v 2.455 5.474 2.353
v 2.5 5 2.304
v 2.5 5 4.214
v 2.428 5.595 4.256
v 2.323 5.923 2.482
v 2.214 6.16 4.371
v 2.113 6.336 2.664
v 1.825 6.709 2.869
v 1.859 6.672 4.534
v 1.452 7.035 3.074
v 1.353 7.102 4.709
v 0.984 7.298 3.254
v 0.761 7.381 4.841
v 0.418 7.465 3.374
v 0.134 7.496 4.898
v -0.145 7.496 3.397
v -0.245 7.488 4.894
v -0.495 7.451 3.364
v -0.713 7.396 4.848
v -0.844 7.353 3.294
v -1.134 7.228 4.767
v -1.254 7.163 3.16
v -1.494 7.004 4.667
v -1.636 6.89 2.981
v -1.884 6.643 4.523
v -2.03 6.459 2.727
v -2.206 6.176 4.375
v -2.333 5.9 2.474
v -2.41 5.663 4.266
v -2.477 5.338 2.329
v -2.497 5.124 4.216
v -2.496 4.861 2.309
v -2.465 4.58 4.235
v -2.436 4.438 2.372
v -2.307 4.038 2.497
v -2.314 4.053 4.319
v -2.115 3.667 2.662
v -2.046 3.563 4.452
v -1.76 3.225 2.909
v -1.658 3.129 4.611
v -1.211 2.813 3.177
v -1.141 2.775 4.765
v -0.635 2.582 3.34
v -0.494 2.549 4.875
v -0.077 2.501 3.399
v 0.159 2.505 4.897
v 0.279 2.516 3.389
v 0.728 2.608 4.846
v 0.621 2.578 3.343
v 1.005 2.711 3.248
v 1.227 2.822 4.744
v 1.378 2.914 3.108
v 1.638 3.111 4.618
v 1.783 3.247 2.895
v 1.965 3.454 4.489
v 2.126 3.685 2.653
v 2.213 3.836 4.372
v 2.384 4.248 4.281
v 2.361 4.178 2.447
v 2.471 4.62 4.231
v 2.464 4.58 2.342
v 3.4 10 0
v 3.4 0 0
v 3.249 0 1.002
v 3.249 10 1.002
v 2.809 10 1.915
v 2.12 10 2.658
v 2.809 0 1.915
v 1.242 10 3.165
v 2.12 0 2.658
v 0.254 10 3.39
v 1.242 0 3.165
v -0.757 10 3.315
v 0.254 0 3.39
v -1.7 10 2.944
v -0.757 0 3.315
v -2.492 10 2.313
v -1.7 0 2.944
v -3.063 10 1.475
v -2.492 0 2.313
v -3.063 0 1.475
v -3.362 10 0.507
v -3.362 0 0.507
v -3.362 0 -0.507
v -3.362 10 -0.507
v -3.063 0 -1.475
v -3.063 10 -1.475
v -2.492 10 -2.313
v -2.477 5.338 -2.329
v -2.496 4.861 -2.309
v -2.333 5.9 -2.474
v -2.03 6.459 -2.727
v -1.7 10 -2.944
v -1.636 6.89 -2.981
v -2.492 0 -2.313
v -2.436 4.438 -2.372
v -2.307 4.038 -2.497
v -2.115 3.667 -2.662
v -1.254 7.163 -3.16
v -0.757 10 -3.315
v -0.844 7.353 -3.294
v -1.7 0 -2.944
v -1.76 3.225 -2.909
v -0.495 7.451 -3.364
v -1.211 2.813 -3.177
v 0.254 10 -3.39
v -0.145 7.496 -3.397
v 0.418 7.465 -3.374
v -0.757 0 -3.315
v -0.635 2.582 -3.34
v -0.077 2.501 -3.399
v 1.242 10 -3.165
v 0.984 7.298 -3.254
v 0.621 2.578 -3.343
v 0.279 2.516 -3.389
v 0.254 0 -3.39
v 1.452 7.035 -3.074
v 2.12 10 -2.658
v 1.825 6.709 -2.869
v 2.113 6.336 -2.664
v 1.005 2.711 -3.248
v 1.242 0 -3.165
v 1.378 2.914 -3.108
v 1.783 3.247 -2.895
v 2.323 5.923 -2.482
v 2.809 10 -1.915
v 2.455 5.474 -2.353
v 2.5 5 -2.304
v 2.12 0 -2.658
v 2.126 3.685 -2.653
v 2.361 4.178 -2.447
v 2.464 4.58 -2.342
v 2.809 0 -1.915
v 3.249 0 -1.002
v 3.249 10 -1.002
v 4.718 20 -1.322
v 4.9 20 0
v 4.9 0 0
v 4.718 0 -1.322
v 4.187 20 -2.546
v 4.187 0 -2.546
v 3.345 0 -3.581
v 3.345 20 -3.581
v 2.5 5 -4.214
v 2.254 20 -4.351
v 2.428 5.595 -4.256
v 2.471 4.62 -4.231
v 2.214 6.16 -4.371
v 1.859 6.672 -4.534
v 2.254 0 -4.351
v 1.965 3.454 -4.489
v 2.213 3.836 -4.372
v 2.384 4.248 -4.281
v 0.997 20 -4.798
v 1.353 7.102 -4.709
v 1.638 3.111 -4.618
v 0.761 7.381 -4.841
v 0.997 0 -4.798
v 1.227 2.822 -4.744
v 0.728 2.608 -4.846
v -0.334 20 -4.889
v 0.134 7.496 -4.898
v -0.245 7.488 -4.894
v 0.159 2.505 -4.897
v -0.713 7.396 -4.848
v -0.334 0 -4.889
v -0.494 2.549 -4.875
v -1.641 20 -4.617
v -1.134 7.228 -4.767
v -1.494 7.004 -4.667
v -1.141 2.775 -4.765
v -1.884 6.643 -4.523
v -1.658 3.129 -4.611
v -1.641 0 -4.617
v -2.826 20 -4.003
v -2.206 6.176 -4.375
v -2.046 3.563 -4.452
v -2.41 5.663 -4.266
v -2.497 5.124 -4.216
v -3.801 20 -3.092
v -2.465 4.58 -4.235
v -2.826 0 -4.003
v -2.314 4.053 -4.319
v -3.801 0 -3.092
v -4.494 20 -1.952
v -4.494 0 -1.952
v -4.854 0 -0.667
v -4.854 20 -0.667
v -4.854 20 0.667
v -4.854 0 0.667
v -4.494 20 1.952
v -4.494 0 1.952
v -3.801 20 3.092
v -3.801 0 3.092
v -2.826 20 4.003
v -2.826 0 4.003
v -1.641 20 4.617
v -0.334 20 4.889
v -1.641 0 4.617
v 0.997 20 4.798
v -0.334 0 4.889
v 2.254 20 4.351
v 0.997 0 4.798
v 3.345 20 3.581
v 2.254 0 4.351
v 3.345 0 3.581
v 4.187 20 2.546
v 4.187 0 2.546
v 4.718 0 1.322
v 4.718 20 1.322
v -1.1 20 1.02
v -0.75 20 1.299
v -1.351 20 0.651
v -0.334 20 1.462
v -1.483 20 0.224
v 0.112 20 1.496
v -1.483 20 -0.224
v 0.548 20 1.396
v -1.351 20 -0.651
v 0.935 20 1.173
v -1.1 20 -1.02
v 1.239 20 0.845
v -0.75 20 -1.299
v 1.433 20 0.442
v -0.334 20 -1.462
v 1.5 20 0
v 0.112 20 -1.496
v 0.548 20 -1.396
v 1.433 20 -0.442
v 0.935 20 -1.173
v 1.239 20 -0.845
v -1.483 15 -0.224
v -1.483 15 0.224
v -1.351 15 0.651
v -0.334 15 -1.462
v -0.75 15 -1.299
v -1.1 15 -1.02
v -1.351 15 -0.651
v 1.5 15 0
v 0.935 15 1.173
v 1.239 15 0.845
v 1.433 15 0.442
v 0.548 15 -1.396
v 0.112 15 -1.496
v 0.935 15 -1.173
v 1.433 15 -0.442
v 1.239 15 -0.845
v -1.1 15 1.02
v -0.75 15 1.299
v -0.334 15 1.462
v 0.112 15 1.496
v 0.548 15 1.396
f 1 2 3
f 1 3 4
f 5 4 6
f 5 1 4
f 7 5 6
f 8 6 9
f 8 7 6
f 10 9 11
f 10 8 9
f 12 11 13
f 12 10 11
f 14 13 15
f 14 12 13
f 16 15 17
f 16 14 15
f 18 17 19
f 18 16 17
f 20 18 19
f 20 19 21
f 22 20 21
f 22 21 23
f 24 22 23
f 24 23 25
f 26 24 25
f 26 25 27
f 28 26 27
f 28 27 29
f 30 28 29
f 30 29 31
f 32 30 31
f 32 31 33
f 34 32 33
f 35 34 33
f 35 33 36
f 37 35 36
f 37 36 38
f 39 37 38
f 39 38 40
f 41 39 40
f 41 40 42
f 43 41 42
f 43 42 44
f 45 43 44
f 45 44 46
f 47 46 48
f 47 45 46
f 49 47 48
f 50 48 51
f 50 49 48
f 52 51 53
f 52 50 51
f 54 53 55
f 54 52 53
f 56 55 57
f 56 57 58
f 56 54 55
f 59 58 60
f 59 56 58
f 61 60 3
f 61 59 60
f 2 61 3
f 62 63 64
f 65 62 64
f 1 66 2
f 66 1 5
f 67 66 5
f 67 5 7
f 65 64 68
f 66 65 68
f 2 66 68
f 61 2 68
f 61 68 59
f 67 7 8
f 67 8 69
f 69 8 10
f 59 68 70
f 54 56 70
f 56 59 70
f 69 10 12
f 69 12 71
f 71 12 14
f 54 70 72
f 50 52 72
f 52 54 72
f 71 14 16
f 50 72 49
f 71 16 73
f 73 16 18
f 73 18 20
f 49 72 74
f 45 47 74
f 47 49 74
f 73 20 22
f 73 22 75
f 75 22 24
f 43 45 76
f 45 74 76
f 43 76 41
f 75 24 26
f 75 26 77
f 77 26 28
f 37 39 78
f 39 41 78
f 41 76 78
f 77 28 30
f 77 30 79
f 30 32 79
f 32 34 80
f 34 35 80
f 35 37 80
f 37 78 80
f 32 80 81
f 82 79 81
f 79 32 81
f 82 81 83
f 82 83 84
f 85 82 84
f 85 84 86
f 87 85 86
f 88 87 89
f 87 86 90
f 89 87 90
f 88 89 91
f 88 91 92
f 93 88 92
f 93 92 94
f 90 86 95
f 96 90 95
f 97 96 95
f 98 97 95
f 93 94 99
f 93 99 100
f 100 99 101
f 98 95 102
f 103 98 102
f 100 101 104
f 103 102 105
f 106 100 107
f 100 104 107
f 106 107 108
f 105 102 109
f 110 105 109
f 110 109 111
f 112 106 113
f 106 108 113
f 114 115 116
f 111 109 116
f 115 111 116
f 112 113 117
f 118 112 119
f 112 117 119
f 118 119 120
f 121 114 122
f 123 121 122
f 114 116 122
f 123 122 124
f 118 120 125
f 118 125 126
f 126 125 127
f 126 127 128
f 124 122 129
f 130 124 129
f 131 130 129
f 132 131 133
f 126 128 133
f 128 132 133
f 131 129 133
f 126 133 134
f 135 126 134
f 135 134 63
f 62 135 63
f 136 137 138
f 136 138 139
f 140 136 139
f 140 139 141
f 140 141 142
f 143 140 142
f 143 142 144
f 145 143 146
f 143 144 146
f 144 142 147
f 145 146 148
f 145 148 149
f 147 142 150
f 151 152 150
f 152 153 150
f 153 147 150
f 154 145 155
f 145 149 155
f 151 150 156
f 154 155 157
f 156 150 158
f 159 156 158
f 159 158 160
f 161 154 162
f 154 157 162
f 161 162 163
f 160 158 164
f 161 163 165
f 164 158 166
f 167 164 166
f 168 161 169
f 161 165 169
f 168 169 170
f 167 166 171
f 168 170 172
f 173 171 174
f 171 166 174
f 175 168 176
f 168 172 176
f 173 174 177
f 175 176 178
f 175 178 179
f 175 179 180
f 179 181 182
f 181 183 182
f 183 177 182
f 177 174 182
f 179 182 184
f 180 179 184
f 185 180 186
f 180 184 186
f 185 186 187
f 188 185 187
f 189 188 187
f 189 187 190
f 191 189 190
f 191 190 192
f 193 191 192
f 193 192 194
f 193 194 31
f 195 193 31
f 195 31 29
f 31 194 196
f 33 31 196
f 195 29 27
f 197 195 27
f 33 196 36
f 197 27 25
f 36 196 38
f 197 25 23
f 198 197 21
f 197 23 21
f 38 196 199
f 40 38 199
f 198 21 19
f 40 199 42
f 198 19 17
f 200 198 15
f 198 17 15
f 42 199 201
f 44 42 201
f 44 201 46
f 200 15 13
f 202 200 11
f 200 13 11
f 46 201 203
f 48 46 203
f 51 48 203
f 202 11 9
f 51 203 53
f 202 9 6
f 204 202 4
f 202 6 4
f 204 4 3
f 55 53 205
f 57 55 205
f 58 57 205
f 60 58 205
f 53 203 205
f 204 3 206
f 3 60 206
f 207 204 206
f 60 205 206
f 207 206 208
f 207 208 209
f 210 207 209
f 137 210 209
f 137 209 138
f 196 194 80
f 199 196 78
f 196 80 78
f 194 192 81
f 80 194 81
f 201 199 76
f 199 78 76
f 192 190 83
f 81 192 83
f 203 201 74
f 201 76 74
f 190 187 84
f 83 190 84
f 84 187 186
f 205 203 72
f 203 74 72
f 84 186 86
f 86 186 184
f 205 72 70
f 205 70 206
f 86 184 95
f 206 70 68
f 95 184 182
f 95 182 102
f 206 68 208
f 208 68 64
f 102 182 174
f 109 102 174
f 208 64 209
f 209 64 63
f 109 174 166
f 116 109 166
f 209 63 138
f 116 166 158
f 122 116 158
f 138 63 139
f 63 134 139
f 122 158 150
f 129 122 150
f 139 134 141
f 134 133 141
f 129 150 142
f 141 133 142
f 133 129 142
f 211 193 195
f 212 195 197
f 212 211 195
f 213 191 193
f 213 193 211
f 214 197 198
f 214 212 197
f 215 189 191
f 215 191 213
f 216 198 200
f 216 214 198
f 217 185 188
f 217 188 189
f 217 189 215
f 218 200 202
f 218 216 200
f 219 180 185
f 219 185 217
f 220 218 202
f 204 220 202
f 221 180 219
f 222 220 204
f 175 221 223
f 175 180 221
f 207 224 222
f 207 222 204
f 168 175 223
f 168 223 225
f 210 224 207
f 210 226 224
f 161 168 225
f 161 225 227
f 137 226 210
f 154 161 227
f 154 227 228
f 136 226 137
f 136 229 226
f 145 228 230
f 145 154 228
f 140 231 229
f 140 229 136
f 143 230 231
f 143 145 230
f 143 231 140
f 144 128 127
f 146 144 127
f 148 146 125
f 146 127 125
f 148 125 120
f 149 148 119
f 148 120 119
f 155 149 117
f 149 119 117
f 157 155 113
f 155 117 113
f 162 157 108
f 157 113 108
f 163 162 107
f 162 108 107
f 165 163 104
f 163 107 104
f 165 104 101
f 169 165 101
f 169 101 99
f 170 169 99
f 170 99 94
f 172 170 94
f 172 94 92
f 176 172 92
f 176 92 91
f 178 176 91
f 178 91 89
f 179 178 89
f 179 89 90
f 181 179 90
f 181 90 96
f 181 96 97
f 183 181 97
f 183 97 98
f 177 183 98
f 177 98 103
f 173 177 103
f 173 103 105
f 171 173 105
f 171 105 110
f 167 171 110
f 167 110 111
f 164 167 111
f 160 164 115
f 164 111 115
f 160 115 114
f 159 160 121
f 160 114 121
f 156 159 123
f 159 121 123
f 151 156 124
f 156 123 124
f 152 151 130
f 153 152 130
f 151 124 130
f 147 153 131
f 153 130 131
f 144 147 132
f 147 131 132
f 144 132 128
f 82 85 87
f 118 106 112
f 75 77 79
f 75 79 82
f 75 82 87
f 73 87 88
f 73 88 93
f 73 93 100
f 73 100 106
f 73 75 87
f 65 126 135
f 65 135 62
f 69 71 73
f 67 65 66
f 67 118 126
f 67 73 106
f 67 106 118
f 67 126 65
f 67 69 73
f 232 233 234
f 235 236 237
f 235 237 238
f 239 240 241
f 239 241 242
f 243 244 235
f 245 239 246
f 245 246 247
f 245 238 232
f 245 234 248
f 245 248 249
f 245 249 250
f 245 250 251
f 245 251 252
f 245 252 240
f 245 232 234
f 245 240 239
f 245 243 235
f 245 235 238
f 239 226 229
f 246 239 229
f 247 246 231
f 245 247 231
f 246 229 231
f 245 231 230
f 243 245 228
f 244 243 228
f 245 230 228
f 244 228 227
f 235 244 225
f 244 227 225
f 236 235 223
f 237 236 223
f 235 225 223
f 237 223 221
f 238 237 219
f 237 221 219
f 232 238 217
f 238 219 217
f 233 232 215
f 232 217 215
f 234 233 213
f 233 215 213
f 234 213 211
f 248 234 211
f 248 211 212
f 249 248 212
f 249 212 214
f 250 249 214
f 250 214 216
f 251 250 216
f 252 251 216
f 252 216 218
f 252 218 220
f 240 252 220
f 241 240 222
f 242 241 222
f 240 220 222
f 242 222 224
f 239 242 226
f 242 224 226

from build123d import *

# Parameters (mm, degrees)
SKETCH1_R               = 4.9
BOSS_EXTRUDE1_DEPTH     = 20
SKETCH2_R               = 1.5
CUT_EXTRUDE1_DEPTH      = 5
SKETCH3_R               = 3.4
CUT_EXTRUDE2_DEPTH      = 10
SKETCH4_R               = 2.5
CUT_EXTRUDE3_DEPTH      = 5.9
CUT_EXTRUDE3_DEPTH_BACK = 5.9


with BuildPart() as part:
    # Sketch1 → Boss-Extrude1 (new body)
    with BuildSketch(Plane(origin=(0, 0, 0), x_dir=(1, 0, 0), z_dir=(0, 1, 0))):
        Circle(SKETCH1_R)
    extrude(amount=BOSS_EXTRUDE1_DEPTH)

    # Sketch2 → Cut-Extrude1 (cut)
    with BuildSketch(Plane(origin=(0, 20, 0), x_dir=(1, 0, 0), z_dir=(0, 1, 0))):
        Circle(SKETCH2_R)
    extrude(amount=-CUT_EXTRUDE1_DEPTH, mode=Mode.SUBTRACT)

    # Sketch3 → Cut-Extrude2 (cut)
    with BuildSketch(Plane.XZ):
        Circle(SKETCH3_R)
    extrude(amount=-CUT_EXTRUDE2_DEPTH, mode=Mode.SUBTRACT)

    # Sketch4 → Cut-Extrude3 (cut, two sides)
    with BuildSketch(Plane.XY) as cut_extrude3_sk:
        with Locations((0, 5)):
            Circle(SKETCH4_R)
    extrude(amount=CUT_EXTRUDE3_DEPTH, mode=Mode.SUBTRACT)
    extrude(cut_extrude3_sk.sketch, amount=-CUT_EXTRUDE3_DEPTH_BACK, mode=Mode.SUBTRACT)


solid = part.part
